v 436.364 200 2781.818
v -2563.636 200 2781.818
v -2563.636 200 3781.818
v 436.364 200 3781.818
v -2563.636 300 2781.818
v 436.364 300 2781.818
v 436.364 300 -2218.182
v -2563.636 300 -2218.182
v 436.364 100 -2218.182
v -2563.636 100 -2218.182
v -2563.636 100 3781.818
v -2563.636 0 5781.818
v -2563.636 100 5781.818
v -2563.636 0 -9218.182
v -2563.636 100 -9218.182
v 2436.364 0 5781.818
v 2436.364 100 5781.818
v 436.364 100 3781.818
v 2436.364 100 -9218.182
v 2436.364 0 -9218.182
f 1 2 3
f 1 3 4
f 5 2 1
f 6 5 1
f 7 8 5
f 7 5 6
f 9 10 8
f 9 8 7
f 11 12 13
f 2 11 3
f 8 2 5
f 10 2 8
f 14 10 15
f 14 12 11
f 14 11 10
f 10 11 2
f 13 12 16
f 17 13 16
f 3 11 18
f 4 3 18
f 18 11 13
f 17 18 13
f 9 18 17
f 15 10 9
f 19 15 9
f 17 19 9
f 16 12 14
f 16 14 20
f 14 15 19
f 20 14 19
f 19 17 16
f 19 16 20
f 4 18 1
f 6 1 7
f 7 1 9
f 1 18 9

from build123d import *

# Parameters (mm, degrees)
CROQUIS1_W              = 3000
CROQUIS1_H              = 8000
SALIENTE_EXTRUIR1_DEPTH = 100
CROQUIS2_W              = 3000
CROQUIS2_H              = 6000
SALIENTE_EXTRUIR2_DEPTH = 100
CROQUIS3_W              = 3000
CROQUIS3_H              = 5000
SALIENTE_EXTRUIR3_DEPTH = 100
CROQUIS5_W              = 5000
CROQUIS5_H              = 15000
SALIENTE_EXTRUIR4_DEPTH = 100


with BuildPart() as part:
    # Croquis1 → Saliente-Extruir1 (new body)
    with BuildSketch(Plane(origin=(0, 0, 0), x_dir=(1, 0, 0), z_dir=(0, 1, 0))):
        with Locations((-1063.636363636, -1781.818181818)):
            Rectangle(CROQUIS1_W, CROQUIS1_H)
    extrude(amount=SALIENTE_EXTRUIR1_DEPTH)

    # Croquis2 → Saliente-Extruir2 (add)
    with BuildSketch(Plane(origin=(0, 100, 0), x_dir=(1, 0, 0), z_dir=(0, 1, 0))):
        with Locations((-1063.636363636, -781.818181818)):
            Rectangle(CROQUIS2_W, CROQUIS2_H)
    extrude(amount=SALIENTE_EXTRUIR2_DEPTH)

    # Croquis3 → Saliente-Extruir3 (add)
    with BuildSketch(Plane(origin=(0, 200, 0), x_dir=(1, 0, 0), z_dir=(0, 1, 0))):
        with Locations((-1063.636363636, -281.818181818)):
            Rectangle(CROQUIS3_W, CROQUIS3_H)
    extrude(amount=SALIENTE_EXTRUIR3_DEPTH)

    # Croquis5 → Saliente-Extruir4 (add)
    with BuildSketch(Plane(origin=(0, 100, 0), x_dir=(1, 0, 0), z_dir=(0, 1, 0))):
        with Locations((-63.636363636, 1718.181818182)):
            Rectangle(CROQUIS5_W, CROQUIS5_H)
    extrude(amount=-SALIENTE_EXTRUIR4_DEPTH)


solid = part.part
